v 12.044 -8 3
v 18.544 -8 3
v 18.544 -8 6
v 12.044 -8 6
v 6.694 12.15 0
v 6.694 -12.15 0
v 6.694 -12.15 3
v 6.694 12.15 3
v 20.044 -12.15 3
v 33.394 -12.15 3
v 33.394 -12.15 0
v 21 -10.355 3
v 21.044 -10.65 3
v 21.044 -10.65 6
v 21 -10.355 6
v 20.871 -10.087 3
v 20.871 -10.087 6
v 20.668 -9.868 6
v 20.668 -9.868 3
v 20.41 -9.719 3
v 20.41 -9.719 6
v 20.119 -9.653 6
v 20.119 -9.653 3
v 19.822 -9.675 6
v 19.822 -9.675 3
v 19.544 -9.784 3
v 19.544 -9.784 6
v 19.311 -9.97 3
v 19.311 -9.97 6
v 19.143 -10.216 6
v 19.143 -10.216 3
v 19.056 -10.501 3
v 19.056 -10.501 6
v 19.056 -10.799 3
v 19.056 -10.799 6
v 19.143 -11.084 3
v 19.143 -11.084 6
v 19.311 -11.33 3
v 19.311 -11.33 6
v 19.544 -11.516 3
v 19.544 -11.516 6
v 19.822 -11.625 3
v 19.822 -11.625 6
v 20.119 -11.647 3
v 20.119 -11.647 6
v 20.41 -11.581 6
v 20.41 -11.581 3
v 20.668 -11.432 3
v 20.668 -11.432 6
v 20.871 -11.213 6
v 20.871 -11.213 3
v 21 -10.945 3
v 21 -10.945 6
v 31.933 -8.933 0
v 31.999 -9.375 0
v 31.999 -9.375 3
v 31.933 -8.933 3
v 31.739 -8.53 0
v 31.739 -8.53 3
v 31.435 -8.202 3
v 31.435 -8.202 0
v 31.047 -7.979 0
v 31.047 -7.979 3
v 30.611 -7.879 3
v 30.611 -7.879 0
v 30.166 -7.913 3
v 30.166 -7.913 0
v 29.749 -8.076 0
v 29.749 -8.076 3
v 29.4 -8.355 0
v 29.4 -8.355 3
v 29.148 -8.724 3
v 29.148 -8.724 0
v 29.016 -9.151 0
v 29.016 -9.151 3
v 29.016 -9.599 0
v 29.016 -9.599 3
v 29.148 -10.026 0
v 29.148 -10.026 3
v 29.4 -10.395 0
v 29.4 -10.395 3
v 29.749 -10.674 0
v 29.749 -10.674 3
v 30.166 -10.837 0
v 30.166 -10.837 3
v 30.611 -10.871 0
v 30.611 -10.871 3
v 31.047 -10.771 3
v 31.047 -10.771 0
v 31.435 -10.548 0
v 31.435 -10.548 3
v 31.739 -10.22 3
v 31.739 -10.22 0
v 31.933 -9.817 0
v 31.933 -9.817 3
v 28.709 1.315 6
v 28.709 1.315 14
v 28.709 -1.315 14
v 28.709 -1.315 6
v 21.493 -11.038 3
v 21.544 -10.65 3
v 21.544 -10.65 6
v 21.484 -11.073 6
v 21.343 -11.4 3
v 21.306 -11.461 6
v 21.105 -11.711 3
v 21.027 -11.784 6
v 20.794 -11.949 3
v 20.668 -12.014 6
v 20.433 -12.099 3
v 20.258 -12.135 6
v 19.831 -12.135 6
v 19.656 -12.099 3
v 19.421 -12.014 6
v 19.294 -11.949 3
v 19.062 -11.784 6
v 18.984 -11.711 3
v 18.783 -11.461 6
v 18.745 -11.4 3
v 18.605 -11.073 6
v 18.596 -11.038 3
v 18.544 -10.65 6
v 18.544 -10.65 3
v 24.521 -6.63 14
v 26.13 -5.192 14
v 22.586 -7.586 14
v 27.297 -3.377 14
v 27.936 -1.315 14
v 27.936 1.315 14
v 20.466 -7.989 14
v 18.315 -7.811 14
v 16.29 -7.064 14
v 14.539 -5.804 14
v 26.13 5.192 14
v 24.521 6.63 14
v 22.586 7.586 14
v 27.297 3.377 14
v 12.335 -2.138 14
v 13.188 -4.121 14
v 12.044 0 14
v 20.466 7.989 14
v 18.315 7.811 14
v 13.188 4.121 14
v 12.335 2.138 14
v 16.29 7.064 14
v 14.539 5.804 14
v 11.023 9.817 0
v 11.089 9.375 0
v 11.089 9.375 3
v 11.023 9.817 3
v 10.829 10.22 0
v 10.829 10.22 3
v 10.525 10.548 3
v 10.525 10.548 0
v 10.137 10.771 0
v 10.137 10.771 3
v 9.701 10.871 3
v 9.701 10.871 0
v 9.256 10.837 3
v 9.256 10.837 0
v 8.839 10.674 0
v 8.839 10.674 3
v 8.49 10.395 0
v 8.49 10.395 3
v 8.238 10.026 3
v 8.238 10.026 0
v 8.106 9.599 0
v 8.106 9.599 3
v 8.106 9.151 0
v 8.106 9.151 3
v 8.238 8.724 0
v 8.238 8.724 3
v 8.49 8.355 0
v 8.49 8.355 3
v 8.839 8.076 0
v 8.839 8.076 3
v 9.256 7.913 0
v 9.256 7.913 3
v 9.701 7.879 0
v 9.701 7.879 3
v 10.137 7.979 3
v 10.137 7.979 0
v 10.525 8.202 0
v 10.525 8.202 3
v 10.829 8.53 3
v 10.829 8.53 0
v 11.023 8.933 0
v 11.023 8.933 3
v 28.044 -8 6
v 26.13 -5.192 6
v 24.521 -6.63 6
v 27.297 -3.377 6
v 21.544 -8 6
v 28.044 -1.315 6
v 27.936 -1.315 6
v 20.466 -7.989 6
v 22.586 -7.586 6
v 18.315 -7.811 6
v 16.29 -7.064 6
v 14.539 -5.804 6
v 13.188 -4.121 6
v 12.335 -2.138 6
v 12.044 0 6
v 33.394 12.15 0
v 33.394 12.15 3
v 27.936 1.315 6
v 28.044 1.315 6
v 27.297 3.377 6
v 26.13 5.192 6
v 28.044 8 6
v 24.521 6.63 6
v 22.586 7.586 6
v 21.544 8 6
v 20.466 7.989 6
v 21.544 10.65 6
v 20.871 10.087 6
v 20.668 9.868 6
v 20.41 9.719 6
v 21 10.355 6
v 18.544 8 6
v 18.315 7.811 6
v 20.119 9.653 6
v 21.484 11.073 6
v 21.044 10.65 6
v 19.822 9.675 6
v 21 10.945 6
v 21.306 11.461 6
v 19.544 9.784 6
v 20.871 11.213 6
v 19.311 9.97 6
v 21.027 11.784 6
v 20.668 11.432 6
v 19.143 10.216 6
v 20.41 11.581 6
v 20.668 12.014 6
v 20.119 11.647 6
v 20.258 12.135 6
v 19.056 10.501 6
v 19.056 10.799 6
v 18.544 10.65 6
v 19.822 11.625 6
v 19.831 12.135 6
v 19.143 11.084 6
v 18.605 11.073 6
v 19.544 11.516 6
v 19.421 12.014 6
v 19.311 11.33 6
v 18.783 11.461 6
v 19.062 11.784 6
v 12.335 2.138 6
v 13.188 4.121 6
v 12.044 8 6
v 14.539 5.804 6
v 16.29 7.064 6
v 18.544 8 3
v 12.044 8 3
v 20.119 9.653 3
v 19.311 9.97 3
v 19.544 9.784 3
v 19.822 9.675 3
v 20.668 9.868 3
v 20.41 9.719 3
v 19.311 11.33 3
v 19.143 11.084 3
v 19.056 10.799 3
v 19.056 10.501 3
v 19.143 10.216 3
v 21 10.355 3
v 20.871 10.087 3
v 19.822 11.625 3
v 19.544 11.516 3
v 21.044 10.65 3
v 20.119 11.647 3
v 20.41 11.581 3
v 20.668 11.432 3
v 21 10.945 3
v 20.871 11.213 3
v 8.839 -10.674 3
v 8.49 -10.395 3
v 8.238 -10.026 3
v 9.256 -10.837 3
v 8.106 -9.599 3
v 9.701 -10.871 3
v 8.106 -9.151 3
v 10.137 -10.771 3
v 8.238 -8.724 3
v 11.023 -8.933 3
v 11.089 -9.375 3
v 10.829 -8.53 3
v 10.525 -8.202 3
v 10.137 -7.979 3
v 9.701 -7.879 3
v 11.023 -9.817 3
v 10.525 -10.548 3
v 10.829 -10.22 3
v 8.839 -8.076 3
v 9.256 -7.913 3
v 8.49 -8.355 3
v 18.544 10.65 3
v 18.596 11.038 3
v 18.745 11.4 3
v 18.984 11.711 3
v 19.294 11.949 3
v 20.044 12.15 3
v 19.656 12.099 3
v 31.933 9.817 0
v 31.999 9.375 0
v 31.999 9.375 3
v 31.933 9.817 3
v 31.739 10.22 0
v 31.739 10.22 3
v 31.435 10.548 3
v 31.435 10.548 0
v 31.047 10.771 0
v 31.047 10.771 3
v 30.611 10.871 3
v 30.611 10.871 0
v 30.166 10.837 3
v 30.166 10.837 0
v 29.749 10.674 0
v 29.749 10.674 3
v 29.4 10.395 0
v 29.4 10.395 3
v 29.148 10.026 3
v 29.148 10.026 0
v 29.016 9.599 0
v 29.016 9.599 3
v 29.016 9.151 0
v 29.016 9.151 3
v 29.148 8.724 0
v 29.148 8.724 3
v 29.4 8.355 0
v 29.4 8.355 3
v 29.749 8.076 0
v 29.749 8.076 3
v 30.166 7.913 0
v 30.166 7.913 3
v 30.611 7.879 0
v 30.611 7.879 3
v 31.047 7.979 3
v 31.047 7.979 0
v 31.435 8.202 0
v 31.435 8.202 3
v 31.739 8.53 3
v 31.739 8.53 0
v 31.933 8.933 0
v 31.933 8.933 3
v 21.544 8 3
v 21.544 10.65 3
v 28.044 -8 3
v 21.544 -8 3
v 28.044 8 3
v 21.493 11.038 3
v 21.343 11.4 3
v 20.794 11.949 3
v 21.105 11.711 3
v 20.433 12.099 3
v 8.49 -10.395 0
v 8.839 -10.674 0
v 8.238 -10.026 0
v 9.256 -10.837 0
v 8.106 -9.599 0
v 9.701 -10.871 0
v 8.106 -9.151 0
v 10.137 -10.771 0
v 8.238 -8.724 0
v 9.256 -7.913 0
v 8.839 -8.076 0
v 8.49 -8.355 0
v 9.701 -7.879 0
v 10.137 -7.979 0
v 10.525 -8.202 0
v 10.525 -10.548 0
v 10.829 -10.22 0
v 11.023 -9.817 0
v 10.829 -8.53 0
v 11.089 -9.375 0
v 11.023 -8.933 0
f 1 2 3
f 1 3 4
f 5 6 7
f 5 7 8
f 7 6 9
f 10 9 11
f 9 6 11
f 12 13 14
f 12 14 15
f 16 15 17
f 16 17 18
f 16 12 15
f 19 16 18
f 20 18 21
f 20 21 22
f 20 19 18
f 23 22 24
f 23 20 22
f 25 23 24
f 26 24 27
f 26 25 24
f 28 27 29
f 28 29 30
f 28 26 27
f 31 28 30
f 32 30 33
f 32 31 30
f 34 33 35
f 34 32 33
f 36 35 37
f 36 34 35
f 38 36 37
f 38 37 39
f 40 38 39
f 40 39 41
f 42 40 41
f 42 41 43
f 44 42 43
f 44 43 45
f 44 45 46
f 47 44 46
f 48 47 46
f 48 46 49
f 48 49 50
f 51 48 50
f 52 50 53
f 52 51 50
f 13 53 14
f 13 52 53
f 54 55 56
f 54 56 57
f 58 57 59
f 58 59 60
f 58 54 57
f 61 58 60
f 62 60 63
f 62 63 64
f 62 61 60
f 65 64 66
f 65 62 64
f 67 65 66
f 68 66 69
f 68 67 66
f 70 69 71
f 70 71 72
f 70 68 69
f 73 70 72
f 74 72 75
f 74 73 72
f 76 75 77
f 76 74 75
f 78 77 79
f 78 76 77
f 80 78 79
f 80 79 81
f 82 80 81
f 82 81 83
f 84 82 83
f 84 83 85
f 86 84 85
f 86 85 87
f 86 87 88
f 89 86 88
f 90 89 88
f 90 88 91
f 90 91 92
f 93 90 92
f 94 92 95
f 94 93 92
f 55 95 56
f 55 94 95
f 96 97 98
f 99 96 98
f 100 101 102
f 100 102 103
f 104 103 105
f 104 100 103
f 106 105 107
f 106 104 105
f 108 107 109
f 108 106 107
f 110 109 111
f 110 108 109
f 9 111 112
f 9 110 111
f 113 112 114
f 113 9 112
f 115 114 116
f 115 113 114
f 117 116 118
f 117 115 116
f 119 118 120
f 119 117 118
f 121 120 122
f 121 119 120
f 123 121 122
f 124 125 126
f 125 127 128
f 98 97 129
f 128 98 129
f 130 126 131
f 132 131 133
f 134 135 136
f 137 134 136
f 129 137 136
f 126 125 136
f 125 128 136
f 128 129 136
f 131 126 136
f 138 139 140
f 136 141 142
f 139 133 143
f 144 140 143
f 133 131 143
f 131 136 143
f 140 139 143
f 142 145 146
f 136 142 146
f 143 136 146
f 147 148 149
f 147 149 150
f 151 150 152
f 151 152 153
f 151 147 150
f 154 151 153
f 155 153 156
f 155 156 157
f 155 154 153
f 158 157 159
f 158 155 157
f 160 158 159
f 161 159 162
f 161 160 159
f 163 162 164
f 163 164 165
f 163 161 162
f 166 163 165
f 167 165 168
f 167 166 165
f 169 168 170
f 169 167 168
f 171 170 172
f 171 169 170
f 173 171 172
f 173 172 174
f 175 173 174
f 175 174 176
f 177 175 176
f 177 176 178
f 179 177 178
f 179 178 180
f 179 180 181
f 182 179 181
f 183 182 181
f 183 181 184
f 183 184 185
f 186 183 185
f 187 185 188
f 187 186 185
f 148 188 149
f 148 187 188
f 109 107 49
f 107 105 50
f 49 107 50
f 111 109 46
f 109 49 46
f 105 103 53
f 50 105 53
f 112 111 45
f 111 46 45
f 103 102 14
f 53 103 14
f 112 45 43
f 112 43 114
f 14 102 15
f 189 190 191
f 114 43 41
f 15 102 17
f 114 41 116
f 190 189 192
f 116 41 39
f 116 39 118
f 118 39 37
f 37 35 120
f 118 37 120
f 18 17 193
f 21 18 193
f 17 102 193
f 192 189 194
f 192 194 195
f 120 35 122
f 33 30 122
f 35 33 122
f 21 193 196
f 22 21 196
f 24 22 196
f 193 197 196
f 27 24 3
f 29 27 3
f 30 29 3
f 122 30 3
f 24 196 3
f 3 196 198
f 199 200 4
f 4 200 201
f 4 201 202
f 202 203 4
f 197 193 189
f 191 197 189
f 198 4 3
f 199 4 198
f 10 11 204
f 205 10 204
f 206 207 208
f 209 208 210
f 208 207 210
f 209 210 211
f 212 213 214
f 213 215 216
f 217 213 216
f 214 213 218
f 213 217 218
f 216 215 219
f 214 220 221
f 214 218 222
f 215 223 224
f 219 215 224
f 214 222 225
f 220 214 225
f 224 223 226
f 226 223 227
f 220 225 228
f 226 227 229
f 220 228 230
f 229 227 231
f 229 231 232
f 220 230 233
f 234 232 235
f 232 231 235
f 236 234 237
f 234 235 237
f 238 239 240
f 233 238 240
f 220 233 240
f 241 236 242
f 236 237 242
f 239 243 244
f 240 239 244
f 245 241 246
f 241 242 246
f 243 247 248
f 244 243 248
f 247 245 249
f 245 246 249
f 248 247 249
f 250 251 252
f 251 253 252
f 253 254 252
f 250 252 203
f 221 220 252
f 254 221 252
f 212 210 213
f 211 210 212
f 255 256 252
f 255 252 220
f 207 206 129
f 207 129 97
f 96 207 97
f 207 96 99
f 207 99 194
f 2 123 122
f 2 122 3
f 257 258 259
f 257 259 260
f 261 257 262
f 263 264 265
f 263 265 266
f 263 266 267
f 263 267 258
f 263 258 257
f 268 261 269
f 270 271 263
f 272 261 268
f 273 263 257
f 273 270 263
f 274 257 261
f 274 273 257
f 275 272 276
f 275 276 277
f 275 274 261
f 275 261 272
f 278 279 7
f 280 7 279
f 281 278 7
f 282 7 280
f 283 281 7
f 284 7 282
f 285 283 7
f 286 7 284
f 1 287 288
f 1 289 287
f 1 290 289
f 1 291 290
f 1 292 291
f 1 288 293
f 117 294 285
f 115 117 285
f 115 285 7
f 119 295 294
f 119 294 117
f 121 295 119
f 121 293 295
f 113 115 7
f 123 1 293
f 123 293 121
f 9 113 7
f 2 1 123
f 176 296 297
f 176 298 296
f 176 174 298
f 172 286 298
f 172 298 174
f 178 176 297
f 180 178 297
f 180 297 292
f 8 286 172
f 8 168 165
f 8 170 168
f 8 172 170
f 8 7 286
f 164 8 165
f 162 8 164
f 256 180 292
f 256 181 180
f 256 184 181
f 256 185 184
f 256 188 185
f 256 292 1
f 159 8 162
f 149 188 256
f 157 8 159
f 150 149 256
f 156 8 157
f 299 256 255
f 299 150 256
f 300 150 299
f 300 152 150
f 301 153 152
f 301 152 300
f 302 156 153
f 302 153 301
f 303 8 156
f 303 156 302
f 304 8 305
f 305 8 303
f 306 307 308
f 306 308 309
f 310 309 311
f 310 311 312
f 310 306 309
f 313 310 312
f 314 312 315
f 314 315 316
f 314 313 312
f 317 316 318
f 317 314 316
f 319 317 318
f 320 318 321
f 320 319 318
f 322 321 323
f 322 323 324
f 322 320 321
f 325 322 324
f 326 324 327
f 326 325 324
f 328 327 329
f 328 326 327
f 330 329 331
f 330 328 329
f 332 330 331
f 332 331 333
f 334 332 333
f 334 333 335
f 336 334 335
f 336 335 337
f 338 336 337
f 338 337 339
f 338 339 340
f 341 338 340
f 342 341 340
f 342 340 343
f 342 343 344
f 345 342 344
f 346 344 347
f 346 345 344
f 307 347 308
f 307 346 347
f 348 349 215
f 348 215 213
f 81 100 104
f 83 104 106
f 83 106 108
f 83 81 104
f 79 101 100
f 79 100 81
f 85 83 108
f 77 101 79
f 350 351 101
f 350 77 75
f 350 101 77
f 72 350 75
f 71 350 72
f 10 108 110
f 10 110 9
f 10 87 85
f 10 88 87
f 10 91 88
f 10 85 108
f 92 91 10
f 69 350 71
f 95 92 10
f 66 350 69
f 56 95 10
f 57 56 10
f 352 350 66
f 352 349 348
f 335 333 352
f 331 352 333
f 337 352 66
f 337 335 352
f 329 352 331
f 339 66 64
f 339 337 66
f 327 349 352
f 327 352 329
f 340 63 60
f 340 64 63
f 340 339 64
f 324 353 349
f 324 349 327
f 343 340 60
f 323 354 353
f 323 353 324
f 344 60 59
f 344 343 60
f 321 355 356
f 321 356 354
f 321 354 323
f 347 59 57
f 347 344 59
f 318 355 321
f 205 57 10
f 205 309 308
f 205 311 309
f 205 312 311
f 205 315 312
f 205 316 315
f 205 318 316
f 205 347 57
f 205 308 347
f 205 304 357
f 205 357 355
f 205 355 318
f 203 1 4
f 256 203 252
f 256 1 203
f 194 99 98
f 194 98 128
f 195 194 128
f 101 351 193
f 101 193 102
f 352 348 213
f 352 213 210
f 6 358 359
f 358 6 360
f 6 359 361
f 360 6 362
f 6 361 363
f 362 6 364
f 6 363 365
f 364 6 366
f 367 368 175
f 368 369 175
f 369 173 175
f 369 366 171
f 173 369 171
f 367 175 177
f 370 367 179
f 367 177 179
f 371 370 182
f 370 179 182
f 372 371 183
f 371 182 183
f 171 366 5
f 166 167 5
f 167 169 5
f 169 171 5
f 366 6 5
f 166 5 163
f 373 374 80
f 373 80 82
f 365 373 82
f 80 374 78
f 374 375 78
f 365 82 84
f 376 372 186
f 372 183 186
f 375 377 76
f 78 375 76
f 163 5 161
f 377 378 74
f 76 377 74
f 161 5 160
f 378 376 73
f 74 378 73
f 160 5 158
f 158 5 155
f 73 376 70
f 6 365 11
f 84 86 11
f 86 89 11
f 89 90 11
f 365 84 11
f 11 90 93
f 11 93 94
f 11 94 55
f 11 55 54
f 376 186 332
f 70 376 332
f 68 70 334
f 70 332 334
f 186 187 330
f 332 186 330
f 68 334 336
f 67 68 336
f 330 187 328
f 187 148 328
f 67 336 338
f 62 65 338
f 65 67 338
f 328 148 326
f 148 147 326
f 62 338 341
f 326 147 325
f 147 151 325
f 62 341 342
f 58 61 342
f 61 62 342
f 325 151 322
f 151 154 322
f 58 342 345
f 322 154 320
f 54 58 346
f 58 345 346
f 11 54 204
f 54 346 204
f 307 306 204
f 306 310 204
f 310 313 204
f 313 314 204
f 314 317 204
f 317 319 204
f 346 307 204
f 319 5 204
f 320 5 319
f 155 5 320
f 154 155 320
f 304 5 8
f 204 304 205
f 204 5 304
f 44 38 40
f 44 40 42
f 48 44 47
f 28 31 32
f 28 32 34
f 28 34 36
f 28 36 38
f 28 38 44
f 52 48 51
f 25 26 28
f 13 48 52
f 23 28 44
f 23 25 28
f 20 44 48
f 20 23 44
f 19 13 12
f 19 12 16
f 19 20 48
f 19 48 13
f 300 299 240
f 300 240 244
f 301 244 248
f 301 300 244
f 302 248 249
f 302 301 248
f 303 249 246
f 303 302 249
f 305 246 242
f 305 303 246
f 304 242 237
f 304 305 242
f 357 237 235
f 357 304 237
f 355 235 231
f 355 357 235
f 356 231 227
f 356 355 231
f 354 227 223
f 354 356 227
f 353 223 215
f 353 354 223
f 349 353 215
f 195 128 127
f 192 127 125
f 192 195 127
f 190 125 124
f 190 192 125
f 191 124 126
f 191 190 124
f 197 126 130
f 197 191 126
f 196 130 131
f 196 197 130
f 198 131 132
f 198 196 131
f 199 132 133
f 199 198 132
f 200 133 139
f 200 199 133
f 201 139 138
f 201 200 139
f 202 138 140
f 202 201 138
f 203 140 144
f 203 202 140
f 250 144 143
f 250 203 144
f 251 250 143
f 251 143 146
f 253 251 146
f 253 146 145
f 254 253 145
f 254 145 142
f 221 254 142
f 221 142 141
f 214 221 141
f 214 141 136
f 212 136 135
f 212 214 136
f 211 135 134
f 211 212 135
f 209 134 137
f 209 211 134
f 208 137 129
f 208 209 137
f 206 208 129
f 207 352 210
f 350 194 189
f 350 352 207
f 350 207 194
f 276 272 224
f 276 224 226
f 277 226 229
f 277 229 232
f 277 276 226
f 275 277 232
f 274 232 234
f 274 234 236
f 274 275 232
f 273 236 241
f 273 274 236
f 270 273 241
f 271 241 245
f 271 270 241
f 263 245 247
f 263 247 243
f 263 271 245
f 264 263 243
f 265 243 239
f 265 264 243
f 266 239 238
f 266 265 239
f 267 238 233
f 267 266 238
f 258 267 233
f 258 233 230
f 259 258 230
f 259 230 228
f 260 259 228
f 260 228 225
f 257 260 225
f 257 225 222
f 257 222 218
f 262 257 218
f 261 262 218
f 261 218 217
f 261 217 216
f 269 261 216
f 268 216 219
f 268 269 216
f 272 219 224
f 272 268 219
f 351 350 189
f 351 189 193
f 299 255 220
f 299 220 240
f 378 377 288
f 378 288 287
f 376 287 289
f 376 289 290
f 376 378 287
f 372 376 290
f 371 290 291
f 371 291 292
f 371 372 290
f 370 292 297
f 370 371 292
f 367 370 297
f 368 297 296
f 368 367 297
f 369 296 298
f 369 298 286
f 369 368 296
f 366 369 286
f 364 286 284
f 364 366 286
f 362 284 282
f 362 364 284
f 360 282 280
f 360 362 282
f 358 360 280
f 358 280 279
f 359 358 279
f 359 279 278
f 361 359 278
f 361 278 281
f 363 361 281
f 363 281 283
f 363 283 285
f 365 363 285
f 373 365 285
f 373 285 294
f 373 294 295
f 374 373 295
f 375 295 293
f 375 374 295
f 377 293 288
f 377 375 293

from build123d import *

# Parameters (mm, degrees)
SKETCH_1_W      = 26.7
SKETCH_1_H      = 24.3
SKETCH_1_R      = 1.5
EXTRUDE_1_DEPTH = 3
SKETCH_2_R      = 1
EXTRUDE_2_DEPTH = 3
EXTRUDE_3_DEPTH = 8


with BuildPart() as part:
    # 草图1 → 凸台-拉伸1 (new body)
    with BuildSketch(Plane.XY):
        with Locations((20.044402297, 0)):
            Rectangle(SKETCH_1_W, SKETCH_1_H)
        with Locations((30.499402297, 9.375)):
            Circle(SKETCH_1_R, mode=Mode.SUBTRACT)
        with Locations((9.589402297, 9.375)):
            Circle(SKETCH_1_R, mode=Mode.SUBTRACT)
        with Locations((30.499402297, -9.375)):
            Circle(SKETCH_1_R, mode=Mode.SUBTRACT)
        with Locations((9.589402297, -9.375)):
            Circle(SKETCH_1_R, mode=Mode.SUBTRACT)
    extrude(amount=EXTRUDE_1_DEPTH)

    # 草图2 → 凸台-拉伸2 (add)
    with BuildSketch(Plane.XY.offset(3)):
        with BuildLine():
            Line((12.044402297, 8), (18.544402297, 8))
            Line((18.544402297, 8), (18.544402297, 10.65))
            ThreePointArc((18.544402297, 10.65), (20.044402297, 12.15), (21.544402297, 10.65))
            Line((21.544402297, 10.65), (21.544402297, 8))
            Line((21.544402297, 8), (28.044402297, 8))
            Line((28.044402297, 8), (28.044402297, 1.75))
            Line((28.044402297, 1.75), (28.044402297, -1.75))
            Line((28.044402297, -1.75), (28.044402297, -8))
            Line((28.044402297, -8), (21.544402297, -8))
            Line((21.544402297, -8), (21.544402297, -10.65))
            ThreePointArc((21.544402297, -10.65), (20.044402297, -12.15), (18.544402297, -10.65))
            Line((18.544402297, -10.65), (18.544402297, -8))
            Line((18.544402297, -8), (12.044402297, -8))
            Line((12.044402297, -8), (12.044402297, -1.75))
            Line((12.044402297, -1.75), (12.044402297, 1.75))
            Line((12.044402297, 1.75), (12.044402297, 8))
        make_face()
        with Locations((20.044402297, 10.65)):
            Circle(SKETCH_2_R, mode=Mode.SUBTRACT)
        with Locations((20.044402297, -10.65)):
            Circle(SKETCH_2_R, mode=Mode.SUBTRACT)
    extrude(amount=EXTRUDE_2_DEPTH)

    # 草图3 → 凸台-拉伸3 (add)
    with BuildSketch(Plane.XY.offset(6)):
        with BuildLine():
            Line((27.935532249, 1.315320523), (28.709062769, 1.315320523))
            Line((28.709062769, 1.315320523), (28.709062769, -1.315320523))
            Line((28.709062769, -1.315320523), (27.935532249, -1.315320523))
            ThreePointArc((27.935532249, -1.315320523), (12.044402297, 0), (27.935532249, 1.315320523))
        make_face()
    extrude(amount=EXTRUDE_3_DEPTH)


solid = part.part
